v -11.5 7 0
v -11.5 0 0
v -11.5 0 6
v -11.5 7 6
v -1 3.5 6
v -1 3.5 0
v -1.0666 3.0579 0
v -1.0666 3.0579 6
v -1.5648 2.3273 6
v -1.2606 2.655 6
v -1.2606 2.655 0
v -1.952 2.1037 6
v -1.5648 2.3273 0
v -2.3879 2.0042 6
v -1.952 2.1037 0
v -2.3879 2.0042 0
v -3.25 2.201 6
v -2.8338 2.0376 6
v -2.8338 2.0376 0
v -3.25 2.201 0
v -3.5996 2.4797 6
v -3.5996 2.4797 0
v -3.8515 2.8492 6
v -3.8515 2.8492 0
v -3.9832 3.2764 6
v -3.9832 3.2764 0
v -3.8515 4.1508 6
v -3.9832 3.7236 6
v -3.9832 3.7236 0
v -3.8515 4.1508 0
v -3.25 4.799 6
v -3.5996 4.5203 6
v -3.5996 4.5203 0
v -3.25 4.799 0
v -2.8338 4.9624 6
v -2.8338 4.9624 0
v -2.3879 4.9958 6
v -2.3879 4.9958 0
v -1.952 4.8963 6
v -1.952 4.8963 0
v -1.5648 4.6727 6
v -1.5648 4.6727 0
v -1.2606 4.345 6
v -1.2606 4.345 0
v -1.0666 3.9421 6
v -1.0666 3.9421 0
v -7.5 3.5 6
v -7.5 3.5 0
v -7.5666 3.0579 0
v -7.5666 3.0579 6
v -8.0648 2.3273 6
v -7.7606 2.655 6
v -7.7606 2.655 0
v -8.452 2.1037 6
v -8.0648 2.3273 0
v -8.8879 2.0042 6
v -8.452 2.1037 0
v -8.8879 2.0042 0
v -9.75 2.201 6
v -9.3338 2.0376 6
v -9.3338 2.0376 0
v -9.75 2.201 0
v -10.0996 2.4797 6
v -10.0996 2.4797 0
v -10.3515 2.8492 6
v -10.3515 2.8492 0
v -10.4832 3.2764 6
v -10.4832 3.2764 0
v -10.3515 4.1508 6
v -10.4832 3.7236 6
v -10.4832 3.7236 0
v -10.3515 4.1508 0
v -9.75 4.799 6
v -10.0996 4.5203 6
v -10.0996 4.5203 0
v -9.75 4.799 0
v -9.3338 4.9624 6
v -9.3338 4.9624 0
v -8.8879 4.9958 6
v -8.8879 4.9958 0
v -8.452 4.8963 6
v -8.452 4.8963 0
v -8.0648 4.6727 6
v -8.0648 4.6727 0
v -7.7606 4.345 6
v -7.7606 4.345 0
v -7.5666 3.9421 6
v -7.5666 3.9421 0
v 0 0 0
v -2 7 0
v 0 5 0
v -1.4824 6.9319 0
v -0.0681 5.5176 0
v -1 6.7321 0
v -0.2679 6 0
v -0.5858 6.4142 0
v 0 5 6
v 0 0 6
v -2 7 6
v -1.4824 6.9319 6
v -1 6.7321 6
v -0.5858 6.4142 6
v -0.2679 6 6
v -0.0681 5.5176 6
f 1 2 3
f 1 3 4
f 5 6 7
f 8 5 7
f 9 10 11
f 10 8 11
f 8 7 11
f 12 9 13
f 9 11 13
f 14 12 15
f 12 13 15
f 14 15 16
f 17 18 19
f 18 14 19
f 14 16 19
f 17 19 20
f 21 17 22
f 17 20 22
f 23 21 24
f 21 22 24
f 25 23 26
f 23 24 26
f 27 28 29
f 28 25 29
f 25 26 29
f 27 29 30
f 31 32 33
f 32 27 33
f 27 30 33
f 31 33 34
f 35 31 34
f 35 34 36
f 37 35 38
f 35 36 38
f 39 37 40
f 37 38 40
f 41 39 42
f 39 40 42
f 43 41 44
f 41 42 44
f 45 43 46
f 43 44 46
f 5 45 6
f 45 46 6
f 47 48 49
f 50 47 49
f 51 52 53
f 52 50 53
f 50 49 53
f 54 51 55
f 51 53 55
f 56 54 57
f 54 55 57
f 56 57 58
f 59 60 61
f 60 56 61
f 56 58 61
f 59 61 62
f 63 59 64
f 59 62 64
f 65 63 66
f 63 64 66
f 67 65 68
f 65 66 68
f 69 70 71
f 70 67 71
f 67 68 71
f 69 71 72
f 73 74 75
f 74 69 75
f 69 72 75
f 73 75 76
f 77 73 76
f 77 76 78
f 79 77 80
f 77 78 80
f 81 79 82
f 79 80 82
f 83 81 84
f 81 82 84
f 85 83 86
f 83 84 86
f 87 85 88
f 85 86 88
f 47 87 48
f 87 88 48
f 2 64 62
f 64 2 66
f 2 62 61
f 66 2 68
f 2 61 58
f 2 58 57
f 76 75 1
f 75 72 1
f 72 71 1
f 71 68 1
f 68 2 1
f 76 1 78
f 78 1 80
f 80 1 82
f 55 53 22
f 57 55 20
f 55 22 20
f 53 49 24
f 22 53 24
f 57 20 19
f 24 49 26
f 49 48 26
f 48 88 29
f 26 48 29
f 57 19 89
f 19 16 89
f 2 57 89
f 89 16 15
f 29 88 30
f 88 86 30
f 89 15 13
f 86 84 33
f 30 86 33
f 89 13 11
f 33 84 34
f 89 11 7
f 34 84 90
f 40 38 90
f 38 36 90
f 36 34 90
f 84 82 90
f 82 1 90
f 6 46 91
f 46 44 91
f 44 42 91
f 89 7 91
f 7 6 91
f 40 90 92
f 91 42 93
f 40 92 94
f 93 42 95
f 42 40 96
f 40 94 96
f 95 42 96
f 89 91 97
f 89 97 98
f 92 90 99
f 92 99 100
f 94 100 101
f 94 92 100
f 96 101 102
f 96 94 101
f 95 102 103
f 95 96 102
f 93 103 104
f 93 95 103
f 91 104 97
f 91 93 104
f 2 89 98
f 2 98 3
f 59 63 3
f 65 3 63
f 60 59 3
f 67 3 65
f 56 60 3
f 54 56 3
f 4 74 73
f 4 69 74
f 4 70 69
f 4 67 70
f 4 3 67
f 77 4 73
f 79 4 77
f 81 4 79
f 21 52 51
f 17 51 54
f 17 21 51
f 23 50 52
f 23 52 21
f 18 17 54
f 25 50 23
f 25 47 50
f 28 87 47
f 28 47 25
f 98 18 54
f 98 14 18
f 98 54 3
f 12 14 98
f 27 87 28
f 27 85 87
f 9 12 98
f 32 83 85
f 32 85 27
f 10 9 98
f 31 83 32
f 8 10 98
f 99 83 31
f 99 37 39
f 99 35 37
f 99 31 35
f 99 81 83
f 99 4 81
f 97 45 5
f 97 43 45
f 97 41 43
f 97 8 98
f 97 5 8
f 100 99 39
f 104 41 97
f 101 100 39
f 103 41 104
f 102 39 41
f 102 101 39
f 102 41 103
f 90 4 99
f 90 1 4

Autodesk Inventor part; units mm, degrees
ref_plane "YZ Plane" through (0, 0, 0) normal (1, 0, 0) x (0, 1, 0)
ref_plane "XZ Plane" through (0, 0, 0) normal (0, 1, 0) x (-1, 0, 0)
ref_plane "XY Plane" through (0, 0, 0) normal (0, 0, 1) x (1, 0, 0)
sketch "Sketch1" plane through (0, 0, 0) normal (0, 0, 1) x (1, 0, 0)
  circle A0 centre (-9, 3.5) radius 1.5
  circle A1 centre (-2.5, 3.5) radius 1.5
  line L0 (0, 0) -> (-11.5, 0)
  line L1 (0, 5) -> (0, 0)
  arc A2 (0, 5) -> (-2, 7) centre (-2, 5) ccw
  line L2 (-11.5, 7) -> (-2, 7)
  line L3 (-11.5, 0) -> (-11.5, 7)
extrude "Extrusion1" add sketch "Sketch1" along normal blind 6
properties part number "yCarMid_c"
